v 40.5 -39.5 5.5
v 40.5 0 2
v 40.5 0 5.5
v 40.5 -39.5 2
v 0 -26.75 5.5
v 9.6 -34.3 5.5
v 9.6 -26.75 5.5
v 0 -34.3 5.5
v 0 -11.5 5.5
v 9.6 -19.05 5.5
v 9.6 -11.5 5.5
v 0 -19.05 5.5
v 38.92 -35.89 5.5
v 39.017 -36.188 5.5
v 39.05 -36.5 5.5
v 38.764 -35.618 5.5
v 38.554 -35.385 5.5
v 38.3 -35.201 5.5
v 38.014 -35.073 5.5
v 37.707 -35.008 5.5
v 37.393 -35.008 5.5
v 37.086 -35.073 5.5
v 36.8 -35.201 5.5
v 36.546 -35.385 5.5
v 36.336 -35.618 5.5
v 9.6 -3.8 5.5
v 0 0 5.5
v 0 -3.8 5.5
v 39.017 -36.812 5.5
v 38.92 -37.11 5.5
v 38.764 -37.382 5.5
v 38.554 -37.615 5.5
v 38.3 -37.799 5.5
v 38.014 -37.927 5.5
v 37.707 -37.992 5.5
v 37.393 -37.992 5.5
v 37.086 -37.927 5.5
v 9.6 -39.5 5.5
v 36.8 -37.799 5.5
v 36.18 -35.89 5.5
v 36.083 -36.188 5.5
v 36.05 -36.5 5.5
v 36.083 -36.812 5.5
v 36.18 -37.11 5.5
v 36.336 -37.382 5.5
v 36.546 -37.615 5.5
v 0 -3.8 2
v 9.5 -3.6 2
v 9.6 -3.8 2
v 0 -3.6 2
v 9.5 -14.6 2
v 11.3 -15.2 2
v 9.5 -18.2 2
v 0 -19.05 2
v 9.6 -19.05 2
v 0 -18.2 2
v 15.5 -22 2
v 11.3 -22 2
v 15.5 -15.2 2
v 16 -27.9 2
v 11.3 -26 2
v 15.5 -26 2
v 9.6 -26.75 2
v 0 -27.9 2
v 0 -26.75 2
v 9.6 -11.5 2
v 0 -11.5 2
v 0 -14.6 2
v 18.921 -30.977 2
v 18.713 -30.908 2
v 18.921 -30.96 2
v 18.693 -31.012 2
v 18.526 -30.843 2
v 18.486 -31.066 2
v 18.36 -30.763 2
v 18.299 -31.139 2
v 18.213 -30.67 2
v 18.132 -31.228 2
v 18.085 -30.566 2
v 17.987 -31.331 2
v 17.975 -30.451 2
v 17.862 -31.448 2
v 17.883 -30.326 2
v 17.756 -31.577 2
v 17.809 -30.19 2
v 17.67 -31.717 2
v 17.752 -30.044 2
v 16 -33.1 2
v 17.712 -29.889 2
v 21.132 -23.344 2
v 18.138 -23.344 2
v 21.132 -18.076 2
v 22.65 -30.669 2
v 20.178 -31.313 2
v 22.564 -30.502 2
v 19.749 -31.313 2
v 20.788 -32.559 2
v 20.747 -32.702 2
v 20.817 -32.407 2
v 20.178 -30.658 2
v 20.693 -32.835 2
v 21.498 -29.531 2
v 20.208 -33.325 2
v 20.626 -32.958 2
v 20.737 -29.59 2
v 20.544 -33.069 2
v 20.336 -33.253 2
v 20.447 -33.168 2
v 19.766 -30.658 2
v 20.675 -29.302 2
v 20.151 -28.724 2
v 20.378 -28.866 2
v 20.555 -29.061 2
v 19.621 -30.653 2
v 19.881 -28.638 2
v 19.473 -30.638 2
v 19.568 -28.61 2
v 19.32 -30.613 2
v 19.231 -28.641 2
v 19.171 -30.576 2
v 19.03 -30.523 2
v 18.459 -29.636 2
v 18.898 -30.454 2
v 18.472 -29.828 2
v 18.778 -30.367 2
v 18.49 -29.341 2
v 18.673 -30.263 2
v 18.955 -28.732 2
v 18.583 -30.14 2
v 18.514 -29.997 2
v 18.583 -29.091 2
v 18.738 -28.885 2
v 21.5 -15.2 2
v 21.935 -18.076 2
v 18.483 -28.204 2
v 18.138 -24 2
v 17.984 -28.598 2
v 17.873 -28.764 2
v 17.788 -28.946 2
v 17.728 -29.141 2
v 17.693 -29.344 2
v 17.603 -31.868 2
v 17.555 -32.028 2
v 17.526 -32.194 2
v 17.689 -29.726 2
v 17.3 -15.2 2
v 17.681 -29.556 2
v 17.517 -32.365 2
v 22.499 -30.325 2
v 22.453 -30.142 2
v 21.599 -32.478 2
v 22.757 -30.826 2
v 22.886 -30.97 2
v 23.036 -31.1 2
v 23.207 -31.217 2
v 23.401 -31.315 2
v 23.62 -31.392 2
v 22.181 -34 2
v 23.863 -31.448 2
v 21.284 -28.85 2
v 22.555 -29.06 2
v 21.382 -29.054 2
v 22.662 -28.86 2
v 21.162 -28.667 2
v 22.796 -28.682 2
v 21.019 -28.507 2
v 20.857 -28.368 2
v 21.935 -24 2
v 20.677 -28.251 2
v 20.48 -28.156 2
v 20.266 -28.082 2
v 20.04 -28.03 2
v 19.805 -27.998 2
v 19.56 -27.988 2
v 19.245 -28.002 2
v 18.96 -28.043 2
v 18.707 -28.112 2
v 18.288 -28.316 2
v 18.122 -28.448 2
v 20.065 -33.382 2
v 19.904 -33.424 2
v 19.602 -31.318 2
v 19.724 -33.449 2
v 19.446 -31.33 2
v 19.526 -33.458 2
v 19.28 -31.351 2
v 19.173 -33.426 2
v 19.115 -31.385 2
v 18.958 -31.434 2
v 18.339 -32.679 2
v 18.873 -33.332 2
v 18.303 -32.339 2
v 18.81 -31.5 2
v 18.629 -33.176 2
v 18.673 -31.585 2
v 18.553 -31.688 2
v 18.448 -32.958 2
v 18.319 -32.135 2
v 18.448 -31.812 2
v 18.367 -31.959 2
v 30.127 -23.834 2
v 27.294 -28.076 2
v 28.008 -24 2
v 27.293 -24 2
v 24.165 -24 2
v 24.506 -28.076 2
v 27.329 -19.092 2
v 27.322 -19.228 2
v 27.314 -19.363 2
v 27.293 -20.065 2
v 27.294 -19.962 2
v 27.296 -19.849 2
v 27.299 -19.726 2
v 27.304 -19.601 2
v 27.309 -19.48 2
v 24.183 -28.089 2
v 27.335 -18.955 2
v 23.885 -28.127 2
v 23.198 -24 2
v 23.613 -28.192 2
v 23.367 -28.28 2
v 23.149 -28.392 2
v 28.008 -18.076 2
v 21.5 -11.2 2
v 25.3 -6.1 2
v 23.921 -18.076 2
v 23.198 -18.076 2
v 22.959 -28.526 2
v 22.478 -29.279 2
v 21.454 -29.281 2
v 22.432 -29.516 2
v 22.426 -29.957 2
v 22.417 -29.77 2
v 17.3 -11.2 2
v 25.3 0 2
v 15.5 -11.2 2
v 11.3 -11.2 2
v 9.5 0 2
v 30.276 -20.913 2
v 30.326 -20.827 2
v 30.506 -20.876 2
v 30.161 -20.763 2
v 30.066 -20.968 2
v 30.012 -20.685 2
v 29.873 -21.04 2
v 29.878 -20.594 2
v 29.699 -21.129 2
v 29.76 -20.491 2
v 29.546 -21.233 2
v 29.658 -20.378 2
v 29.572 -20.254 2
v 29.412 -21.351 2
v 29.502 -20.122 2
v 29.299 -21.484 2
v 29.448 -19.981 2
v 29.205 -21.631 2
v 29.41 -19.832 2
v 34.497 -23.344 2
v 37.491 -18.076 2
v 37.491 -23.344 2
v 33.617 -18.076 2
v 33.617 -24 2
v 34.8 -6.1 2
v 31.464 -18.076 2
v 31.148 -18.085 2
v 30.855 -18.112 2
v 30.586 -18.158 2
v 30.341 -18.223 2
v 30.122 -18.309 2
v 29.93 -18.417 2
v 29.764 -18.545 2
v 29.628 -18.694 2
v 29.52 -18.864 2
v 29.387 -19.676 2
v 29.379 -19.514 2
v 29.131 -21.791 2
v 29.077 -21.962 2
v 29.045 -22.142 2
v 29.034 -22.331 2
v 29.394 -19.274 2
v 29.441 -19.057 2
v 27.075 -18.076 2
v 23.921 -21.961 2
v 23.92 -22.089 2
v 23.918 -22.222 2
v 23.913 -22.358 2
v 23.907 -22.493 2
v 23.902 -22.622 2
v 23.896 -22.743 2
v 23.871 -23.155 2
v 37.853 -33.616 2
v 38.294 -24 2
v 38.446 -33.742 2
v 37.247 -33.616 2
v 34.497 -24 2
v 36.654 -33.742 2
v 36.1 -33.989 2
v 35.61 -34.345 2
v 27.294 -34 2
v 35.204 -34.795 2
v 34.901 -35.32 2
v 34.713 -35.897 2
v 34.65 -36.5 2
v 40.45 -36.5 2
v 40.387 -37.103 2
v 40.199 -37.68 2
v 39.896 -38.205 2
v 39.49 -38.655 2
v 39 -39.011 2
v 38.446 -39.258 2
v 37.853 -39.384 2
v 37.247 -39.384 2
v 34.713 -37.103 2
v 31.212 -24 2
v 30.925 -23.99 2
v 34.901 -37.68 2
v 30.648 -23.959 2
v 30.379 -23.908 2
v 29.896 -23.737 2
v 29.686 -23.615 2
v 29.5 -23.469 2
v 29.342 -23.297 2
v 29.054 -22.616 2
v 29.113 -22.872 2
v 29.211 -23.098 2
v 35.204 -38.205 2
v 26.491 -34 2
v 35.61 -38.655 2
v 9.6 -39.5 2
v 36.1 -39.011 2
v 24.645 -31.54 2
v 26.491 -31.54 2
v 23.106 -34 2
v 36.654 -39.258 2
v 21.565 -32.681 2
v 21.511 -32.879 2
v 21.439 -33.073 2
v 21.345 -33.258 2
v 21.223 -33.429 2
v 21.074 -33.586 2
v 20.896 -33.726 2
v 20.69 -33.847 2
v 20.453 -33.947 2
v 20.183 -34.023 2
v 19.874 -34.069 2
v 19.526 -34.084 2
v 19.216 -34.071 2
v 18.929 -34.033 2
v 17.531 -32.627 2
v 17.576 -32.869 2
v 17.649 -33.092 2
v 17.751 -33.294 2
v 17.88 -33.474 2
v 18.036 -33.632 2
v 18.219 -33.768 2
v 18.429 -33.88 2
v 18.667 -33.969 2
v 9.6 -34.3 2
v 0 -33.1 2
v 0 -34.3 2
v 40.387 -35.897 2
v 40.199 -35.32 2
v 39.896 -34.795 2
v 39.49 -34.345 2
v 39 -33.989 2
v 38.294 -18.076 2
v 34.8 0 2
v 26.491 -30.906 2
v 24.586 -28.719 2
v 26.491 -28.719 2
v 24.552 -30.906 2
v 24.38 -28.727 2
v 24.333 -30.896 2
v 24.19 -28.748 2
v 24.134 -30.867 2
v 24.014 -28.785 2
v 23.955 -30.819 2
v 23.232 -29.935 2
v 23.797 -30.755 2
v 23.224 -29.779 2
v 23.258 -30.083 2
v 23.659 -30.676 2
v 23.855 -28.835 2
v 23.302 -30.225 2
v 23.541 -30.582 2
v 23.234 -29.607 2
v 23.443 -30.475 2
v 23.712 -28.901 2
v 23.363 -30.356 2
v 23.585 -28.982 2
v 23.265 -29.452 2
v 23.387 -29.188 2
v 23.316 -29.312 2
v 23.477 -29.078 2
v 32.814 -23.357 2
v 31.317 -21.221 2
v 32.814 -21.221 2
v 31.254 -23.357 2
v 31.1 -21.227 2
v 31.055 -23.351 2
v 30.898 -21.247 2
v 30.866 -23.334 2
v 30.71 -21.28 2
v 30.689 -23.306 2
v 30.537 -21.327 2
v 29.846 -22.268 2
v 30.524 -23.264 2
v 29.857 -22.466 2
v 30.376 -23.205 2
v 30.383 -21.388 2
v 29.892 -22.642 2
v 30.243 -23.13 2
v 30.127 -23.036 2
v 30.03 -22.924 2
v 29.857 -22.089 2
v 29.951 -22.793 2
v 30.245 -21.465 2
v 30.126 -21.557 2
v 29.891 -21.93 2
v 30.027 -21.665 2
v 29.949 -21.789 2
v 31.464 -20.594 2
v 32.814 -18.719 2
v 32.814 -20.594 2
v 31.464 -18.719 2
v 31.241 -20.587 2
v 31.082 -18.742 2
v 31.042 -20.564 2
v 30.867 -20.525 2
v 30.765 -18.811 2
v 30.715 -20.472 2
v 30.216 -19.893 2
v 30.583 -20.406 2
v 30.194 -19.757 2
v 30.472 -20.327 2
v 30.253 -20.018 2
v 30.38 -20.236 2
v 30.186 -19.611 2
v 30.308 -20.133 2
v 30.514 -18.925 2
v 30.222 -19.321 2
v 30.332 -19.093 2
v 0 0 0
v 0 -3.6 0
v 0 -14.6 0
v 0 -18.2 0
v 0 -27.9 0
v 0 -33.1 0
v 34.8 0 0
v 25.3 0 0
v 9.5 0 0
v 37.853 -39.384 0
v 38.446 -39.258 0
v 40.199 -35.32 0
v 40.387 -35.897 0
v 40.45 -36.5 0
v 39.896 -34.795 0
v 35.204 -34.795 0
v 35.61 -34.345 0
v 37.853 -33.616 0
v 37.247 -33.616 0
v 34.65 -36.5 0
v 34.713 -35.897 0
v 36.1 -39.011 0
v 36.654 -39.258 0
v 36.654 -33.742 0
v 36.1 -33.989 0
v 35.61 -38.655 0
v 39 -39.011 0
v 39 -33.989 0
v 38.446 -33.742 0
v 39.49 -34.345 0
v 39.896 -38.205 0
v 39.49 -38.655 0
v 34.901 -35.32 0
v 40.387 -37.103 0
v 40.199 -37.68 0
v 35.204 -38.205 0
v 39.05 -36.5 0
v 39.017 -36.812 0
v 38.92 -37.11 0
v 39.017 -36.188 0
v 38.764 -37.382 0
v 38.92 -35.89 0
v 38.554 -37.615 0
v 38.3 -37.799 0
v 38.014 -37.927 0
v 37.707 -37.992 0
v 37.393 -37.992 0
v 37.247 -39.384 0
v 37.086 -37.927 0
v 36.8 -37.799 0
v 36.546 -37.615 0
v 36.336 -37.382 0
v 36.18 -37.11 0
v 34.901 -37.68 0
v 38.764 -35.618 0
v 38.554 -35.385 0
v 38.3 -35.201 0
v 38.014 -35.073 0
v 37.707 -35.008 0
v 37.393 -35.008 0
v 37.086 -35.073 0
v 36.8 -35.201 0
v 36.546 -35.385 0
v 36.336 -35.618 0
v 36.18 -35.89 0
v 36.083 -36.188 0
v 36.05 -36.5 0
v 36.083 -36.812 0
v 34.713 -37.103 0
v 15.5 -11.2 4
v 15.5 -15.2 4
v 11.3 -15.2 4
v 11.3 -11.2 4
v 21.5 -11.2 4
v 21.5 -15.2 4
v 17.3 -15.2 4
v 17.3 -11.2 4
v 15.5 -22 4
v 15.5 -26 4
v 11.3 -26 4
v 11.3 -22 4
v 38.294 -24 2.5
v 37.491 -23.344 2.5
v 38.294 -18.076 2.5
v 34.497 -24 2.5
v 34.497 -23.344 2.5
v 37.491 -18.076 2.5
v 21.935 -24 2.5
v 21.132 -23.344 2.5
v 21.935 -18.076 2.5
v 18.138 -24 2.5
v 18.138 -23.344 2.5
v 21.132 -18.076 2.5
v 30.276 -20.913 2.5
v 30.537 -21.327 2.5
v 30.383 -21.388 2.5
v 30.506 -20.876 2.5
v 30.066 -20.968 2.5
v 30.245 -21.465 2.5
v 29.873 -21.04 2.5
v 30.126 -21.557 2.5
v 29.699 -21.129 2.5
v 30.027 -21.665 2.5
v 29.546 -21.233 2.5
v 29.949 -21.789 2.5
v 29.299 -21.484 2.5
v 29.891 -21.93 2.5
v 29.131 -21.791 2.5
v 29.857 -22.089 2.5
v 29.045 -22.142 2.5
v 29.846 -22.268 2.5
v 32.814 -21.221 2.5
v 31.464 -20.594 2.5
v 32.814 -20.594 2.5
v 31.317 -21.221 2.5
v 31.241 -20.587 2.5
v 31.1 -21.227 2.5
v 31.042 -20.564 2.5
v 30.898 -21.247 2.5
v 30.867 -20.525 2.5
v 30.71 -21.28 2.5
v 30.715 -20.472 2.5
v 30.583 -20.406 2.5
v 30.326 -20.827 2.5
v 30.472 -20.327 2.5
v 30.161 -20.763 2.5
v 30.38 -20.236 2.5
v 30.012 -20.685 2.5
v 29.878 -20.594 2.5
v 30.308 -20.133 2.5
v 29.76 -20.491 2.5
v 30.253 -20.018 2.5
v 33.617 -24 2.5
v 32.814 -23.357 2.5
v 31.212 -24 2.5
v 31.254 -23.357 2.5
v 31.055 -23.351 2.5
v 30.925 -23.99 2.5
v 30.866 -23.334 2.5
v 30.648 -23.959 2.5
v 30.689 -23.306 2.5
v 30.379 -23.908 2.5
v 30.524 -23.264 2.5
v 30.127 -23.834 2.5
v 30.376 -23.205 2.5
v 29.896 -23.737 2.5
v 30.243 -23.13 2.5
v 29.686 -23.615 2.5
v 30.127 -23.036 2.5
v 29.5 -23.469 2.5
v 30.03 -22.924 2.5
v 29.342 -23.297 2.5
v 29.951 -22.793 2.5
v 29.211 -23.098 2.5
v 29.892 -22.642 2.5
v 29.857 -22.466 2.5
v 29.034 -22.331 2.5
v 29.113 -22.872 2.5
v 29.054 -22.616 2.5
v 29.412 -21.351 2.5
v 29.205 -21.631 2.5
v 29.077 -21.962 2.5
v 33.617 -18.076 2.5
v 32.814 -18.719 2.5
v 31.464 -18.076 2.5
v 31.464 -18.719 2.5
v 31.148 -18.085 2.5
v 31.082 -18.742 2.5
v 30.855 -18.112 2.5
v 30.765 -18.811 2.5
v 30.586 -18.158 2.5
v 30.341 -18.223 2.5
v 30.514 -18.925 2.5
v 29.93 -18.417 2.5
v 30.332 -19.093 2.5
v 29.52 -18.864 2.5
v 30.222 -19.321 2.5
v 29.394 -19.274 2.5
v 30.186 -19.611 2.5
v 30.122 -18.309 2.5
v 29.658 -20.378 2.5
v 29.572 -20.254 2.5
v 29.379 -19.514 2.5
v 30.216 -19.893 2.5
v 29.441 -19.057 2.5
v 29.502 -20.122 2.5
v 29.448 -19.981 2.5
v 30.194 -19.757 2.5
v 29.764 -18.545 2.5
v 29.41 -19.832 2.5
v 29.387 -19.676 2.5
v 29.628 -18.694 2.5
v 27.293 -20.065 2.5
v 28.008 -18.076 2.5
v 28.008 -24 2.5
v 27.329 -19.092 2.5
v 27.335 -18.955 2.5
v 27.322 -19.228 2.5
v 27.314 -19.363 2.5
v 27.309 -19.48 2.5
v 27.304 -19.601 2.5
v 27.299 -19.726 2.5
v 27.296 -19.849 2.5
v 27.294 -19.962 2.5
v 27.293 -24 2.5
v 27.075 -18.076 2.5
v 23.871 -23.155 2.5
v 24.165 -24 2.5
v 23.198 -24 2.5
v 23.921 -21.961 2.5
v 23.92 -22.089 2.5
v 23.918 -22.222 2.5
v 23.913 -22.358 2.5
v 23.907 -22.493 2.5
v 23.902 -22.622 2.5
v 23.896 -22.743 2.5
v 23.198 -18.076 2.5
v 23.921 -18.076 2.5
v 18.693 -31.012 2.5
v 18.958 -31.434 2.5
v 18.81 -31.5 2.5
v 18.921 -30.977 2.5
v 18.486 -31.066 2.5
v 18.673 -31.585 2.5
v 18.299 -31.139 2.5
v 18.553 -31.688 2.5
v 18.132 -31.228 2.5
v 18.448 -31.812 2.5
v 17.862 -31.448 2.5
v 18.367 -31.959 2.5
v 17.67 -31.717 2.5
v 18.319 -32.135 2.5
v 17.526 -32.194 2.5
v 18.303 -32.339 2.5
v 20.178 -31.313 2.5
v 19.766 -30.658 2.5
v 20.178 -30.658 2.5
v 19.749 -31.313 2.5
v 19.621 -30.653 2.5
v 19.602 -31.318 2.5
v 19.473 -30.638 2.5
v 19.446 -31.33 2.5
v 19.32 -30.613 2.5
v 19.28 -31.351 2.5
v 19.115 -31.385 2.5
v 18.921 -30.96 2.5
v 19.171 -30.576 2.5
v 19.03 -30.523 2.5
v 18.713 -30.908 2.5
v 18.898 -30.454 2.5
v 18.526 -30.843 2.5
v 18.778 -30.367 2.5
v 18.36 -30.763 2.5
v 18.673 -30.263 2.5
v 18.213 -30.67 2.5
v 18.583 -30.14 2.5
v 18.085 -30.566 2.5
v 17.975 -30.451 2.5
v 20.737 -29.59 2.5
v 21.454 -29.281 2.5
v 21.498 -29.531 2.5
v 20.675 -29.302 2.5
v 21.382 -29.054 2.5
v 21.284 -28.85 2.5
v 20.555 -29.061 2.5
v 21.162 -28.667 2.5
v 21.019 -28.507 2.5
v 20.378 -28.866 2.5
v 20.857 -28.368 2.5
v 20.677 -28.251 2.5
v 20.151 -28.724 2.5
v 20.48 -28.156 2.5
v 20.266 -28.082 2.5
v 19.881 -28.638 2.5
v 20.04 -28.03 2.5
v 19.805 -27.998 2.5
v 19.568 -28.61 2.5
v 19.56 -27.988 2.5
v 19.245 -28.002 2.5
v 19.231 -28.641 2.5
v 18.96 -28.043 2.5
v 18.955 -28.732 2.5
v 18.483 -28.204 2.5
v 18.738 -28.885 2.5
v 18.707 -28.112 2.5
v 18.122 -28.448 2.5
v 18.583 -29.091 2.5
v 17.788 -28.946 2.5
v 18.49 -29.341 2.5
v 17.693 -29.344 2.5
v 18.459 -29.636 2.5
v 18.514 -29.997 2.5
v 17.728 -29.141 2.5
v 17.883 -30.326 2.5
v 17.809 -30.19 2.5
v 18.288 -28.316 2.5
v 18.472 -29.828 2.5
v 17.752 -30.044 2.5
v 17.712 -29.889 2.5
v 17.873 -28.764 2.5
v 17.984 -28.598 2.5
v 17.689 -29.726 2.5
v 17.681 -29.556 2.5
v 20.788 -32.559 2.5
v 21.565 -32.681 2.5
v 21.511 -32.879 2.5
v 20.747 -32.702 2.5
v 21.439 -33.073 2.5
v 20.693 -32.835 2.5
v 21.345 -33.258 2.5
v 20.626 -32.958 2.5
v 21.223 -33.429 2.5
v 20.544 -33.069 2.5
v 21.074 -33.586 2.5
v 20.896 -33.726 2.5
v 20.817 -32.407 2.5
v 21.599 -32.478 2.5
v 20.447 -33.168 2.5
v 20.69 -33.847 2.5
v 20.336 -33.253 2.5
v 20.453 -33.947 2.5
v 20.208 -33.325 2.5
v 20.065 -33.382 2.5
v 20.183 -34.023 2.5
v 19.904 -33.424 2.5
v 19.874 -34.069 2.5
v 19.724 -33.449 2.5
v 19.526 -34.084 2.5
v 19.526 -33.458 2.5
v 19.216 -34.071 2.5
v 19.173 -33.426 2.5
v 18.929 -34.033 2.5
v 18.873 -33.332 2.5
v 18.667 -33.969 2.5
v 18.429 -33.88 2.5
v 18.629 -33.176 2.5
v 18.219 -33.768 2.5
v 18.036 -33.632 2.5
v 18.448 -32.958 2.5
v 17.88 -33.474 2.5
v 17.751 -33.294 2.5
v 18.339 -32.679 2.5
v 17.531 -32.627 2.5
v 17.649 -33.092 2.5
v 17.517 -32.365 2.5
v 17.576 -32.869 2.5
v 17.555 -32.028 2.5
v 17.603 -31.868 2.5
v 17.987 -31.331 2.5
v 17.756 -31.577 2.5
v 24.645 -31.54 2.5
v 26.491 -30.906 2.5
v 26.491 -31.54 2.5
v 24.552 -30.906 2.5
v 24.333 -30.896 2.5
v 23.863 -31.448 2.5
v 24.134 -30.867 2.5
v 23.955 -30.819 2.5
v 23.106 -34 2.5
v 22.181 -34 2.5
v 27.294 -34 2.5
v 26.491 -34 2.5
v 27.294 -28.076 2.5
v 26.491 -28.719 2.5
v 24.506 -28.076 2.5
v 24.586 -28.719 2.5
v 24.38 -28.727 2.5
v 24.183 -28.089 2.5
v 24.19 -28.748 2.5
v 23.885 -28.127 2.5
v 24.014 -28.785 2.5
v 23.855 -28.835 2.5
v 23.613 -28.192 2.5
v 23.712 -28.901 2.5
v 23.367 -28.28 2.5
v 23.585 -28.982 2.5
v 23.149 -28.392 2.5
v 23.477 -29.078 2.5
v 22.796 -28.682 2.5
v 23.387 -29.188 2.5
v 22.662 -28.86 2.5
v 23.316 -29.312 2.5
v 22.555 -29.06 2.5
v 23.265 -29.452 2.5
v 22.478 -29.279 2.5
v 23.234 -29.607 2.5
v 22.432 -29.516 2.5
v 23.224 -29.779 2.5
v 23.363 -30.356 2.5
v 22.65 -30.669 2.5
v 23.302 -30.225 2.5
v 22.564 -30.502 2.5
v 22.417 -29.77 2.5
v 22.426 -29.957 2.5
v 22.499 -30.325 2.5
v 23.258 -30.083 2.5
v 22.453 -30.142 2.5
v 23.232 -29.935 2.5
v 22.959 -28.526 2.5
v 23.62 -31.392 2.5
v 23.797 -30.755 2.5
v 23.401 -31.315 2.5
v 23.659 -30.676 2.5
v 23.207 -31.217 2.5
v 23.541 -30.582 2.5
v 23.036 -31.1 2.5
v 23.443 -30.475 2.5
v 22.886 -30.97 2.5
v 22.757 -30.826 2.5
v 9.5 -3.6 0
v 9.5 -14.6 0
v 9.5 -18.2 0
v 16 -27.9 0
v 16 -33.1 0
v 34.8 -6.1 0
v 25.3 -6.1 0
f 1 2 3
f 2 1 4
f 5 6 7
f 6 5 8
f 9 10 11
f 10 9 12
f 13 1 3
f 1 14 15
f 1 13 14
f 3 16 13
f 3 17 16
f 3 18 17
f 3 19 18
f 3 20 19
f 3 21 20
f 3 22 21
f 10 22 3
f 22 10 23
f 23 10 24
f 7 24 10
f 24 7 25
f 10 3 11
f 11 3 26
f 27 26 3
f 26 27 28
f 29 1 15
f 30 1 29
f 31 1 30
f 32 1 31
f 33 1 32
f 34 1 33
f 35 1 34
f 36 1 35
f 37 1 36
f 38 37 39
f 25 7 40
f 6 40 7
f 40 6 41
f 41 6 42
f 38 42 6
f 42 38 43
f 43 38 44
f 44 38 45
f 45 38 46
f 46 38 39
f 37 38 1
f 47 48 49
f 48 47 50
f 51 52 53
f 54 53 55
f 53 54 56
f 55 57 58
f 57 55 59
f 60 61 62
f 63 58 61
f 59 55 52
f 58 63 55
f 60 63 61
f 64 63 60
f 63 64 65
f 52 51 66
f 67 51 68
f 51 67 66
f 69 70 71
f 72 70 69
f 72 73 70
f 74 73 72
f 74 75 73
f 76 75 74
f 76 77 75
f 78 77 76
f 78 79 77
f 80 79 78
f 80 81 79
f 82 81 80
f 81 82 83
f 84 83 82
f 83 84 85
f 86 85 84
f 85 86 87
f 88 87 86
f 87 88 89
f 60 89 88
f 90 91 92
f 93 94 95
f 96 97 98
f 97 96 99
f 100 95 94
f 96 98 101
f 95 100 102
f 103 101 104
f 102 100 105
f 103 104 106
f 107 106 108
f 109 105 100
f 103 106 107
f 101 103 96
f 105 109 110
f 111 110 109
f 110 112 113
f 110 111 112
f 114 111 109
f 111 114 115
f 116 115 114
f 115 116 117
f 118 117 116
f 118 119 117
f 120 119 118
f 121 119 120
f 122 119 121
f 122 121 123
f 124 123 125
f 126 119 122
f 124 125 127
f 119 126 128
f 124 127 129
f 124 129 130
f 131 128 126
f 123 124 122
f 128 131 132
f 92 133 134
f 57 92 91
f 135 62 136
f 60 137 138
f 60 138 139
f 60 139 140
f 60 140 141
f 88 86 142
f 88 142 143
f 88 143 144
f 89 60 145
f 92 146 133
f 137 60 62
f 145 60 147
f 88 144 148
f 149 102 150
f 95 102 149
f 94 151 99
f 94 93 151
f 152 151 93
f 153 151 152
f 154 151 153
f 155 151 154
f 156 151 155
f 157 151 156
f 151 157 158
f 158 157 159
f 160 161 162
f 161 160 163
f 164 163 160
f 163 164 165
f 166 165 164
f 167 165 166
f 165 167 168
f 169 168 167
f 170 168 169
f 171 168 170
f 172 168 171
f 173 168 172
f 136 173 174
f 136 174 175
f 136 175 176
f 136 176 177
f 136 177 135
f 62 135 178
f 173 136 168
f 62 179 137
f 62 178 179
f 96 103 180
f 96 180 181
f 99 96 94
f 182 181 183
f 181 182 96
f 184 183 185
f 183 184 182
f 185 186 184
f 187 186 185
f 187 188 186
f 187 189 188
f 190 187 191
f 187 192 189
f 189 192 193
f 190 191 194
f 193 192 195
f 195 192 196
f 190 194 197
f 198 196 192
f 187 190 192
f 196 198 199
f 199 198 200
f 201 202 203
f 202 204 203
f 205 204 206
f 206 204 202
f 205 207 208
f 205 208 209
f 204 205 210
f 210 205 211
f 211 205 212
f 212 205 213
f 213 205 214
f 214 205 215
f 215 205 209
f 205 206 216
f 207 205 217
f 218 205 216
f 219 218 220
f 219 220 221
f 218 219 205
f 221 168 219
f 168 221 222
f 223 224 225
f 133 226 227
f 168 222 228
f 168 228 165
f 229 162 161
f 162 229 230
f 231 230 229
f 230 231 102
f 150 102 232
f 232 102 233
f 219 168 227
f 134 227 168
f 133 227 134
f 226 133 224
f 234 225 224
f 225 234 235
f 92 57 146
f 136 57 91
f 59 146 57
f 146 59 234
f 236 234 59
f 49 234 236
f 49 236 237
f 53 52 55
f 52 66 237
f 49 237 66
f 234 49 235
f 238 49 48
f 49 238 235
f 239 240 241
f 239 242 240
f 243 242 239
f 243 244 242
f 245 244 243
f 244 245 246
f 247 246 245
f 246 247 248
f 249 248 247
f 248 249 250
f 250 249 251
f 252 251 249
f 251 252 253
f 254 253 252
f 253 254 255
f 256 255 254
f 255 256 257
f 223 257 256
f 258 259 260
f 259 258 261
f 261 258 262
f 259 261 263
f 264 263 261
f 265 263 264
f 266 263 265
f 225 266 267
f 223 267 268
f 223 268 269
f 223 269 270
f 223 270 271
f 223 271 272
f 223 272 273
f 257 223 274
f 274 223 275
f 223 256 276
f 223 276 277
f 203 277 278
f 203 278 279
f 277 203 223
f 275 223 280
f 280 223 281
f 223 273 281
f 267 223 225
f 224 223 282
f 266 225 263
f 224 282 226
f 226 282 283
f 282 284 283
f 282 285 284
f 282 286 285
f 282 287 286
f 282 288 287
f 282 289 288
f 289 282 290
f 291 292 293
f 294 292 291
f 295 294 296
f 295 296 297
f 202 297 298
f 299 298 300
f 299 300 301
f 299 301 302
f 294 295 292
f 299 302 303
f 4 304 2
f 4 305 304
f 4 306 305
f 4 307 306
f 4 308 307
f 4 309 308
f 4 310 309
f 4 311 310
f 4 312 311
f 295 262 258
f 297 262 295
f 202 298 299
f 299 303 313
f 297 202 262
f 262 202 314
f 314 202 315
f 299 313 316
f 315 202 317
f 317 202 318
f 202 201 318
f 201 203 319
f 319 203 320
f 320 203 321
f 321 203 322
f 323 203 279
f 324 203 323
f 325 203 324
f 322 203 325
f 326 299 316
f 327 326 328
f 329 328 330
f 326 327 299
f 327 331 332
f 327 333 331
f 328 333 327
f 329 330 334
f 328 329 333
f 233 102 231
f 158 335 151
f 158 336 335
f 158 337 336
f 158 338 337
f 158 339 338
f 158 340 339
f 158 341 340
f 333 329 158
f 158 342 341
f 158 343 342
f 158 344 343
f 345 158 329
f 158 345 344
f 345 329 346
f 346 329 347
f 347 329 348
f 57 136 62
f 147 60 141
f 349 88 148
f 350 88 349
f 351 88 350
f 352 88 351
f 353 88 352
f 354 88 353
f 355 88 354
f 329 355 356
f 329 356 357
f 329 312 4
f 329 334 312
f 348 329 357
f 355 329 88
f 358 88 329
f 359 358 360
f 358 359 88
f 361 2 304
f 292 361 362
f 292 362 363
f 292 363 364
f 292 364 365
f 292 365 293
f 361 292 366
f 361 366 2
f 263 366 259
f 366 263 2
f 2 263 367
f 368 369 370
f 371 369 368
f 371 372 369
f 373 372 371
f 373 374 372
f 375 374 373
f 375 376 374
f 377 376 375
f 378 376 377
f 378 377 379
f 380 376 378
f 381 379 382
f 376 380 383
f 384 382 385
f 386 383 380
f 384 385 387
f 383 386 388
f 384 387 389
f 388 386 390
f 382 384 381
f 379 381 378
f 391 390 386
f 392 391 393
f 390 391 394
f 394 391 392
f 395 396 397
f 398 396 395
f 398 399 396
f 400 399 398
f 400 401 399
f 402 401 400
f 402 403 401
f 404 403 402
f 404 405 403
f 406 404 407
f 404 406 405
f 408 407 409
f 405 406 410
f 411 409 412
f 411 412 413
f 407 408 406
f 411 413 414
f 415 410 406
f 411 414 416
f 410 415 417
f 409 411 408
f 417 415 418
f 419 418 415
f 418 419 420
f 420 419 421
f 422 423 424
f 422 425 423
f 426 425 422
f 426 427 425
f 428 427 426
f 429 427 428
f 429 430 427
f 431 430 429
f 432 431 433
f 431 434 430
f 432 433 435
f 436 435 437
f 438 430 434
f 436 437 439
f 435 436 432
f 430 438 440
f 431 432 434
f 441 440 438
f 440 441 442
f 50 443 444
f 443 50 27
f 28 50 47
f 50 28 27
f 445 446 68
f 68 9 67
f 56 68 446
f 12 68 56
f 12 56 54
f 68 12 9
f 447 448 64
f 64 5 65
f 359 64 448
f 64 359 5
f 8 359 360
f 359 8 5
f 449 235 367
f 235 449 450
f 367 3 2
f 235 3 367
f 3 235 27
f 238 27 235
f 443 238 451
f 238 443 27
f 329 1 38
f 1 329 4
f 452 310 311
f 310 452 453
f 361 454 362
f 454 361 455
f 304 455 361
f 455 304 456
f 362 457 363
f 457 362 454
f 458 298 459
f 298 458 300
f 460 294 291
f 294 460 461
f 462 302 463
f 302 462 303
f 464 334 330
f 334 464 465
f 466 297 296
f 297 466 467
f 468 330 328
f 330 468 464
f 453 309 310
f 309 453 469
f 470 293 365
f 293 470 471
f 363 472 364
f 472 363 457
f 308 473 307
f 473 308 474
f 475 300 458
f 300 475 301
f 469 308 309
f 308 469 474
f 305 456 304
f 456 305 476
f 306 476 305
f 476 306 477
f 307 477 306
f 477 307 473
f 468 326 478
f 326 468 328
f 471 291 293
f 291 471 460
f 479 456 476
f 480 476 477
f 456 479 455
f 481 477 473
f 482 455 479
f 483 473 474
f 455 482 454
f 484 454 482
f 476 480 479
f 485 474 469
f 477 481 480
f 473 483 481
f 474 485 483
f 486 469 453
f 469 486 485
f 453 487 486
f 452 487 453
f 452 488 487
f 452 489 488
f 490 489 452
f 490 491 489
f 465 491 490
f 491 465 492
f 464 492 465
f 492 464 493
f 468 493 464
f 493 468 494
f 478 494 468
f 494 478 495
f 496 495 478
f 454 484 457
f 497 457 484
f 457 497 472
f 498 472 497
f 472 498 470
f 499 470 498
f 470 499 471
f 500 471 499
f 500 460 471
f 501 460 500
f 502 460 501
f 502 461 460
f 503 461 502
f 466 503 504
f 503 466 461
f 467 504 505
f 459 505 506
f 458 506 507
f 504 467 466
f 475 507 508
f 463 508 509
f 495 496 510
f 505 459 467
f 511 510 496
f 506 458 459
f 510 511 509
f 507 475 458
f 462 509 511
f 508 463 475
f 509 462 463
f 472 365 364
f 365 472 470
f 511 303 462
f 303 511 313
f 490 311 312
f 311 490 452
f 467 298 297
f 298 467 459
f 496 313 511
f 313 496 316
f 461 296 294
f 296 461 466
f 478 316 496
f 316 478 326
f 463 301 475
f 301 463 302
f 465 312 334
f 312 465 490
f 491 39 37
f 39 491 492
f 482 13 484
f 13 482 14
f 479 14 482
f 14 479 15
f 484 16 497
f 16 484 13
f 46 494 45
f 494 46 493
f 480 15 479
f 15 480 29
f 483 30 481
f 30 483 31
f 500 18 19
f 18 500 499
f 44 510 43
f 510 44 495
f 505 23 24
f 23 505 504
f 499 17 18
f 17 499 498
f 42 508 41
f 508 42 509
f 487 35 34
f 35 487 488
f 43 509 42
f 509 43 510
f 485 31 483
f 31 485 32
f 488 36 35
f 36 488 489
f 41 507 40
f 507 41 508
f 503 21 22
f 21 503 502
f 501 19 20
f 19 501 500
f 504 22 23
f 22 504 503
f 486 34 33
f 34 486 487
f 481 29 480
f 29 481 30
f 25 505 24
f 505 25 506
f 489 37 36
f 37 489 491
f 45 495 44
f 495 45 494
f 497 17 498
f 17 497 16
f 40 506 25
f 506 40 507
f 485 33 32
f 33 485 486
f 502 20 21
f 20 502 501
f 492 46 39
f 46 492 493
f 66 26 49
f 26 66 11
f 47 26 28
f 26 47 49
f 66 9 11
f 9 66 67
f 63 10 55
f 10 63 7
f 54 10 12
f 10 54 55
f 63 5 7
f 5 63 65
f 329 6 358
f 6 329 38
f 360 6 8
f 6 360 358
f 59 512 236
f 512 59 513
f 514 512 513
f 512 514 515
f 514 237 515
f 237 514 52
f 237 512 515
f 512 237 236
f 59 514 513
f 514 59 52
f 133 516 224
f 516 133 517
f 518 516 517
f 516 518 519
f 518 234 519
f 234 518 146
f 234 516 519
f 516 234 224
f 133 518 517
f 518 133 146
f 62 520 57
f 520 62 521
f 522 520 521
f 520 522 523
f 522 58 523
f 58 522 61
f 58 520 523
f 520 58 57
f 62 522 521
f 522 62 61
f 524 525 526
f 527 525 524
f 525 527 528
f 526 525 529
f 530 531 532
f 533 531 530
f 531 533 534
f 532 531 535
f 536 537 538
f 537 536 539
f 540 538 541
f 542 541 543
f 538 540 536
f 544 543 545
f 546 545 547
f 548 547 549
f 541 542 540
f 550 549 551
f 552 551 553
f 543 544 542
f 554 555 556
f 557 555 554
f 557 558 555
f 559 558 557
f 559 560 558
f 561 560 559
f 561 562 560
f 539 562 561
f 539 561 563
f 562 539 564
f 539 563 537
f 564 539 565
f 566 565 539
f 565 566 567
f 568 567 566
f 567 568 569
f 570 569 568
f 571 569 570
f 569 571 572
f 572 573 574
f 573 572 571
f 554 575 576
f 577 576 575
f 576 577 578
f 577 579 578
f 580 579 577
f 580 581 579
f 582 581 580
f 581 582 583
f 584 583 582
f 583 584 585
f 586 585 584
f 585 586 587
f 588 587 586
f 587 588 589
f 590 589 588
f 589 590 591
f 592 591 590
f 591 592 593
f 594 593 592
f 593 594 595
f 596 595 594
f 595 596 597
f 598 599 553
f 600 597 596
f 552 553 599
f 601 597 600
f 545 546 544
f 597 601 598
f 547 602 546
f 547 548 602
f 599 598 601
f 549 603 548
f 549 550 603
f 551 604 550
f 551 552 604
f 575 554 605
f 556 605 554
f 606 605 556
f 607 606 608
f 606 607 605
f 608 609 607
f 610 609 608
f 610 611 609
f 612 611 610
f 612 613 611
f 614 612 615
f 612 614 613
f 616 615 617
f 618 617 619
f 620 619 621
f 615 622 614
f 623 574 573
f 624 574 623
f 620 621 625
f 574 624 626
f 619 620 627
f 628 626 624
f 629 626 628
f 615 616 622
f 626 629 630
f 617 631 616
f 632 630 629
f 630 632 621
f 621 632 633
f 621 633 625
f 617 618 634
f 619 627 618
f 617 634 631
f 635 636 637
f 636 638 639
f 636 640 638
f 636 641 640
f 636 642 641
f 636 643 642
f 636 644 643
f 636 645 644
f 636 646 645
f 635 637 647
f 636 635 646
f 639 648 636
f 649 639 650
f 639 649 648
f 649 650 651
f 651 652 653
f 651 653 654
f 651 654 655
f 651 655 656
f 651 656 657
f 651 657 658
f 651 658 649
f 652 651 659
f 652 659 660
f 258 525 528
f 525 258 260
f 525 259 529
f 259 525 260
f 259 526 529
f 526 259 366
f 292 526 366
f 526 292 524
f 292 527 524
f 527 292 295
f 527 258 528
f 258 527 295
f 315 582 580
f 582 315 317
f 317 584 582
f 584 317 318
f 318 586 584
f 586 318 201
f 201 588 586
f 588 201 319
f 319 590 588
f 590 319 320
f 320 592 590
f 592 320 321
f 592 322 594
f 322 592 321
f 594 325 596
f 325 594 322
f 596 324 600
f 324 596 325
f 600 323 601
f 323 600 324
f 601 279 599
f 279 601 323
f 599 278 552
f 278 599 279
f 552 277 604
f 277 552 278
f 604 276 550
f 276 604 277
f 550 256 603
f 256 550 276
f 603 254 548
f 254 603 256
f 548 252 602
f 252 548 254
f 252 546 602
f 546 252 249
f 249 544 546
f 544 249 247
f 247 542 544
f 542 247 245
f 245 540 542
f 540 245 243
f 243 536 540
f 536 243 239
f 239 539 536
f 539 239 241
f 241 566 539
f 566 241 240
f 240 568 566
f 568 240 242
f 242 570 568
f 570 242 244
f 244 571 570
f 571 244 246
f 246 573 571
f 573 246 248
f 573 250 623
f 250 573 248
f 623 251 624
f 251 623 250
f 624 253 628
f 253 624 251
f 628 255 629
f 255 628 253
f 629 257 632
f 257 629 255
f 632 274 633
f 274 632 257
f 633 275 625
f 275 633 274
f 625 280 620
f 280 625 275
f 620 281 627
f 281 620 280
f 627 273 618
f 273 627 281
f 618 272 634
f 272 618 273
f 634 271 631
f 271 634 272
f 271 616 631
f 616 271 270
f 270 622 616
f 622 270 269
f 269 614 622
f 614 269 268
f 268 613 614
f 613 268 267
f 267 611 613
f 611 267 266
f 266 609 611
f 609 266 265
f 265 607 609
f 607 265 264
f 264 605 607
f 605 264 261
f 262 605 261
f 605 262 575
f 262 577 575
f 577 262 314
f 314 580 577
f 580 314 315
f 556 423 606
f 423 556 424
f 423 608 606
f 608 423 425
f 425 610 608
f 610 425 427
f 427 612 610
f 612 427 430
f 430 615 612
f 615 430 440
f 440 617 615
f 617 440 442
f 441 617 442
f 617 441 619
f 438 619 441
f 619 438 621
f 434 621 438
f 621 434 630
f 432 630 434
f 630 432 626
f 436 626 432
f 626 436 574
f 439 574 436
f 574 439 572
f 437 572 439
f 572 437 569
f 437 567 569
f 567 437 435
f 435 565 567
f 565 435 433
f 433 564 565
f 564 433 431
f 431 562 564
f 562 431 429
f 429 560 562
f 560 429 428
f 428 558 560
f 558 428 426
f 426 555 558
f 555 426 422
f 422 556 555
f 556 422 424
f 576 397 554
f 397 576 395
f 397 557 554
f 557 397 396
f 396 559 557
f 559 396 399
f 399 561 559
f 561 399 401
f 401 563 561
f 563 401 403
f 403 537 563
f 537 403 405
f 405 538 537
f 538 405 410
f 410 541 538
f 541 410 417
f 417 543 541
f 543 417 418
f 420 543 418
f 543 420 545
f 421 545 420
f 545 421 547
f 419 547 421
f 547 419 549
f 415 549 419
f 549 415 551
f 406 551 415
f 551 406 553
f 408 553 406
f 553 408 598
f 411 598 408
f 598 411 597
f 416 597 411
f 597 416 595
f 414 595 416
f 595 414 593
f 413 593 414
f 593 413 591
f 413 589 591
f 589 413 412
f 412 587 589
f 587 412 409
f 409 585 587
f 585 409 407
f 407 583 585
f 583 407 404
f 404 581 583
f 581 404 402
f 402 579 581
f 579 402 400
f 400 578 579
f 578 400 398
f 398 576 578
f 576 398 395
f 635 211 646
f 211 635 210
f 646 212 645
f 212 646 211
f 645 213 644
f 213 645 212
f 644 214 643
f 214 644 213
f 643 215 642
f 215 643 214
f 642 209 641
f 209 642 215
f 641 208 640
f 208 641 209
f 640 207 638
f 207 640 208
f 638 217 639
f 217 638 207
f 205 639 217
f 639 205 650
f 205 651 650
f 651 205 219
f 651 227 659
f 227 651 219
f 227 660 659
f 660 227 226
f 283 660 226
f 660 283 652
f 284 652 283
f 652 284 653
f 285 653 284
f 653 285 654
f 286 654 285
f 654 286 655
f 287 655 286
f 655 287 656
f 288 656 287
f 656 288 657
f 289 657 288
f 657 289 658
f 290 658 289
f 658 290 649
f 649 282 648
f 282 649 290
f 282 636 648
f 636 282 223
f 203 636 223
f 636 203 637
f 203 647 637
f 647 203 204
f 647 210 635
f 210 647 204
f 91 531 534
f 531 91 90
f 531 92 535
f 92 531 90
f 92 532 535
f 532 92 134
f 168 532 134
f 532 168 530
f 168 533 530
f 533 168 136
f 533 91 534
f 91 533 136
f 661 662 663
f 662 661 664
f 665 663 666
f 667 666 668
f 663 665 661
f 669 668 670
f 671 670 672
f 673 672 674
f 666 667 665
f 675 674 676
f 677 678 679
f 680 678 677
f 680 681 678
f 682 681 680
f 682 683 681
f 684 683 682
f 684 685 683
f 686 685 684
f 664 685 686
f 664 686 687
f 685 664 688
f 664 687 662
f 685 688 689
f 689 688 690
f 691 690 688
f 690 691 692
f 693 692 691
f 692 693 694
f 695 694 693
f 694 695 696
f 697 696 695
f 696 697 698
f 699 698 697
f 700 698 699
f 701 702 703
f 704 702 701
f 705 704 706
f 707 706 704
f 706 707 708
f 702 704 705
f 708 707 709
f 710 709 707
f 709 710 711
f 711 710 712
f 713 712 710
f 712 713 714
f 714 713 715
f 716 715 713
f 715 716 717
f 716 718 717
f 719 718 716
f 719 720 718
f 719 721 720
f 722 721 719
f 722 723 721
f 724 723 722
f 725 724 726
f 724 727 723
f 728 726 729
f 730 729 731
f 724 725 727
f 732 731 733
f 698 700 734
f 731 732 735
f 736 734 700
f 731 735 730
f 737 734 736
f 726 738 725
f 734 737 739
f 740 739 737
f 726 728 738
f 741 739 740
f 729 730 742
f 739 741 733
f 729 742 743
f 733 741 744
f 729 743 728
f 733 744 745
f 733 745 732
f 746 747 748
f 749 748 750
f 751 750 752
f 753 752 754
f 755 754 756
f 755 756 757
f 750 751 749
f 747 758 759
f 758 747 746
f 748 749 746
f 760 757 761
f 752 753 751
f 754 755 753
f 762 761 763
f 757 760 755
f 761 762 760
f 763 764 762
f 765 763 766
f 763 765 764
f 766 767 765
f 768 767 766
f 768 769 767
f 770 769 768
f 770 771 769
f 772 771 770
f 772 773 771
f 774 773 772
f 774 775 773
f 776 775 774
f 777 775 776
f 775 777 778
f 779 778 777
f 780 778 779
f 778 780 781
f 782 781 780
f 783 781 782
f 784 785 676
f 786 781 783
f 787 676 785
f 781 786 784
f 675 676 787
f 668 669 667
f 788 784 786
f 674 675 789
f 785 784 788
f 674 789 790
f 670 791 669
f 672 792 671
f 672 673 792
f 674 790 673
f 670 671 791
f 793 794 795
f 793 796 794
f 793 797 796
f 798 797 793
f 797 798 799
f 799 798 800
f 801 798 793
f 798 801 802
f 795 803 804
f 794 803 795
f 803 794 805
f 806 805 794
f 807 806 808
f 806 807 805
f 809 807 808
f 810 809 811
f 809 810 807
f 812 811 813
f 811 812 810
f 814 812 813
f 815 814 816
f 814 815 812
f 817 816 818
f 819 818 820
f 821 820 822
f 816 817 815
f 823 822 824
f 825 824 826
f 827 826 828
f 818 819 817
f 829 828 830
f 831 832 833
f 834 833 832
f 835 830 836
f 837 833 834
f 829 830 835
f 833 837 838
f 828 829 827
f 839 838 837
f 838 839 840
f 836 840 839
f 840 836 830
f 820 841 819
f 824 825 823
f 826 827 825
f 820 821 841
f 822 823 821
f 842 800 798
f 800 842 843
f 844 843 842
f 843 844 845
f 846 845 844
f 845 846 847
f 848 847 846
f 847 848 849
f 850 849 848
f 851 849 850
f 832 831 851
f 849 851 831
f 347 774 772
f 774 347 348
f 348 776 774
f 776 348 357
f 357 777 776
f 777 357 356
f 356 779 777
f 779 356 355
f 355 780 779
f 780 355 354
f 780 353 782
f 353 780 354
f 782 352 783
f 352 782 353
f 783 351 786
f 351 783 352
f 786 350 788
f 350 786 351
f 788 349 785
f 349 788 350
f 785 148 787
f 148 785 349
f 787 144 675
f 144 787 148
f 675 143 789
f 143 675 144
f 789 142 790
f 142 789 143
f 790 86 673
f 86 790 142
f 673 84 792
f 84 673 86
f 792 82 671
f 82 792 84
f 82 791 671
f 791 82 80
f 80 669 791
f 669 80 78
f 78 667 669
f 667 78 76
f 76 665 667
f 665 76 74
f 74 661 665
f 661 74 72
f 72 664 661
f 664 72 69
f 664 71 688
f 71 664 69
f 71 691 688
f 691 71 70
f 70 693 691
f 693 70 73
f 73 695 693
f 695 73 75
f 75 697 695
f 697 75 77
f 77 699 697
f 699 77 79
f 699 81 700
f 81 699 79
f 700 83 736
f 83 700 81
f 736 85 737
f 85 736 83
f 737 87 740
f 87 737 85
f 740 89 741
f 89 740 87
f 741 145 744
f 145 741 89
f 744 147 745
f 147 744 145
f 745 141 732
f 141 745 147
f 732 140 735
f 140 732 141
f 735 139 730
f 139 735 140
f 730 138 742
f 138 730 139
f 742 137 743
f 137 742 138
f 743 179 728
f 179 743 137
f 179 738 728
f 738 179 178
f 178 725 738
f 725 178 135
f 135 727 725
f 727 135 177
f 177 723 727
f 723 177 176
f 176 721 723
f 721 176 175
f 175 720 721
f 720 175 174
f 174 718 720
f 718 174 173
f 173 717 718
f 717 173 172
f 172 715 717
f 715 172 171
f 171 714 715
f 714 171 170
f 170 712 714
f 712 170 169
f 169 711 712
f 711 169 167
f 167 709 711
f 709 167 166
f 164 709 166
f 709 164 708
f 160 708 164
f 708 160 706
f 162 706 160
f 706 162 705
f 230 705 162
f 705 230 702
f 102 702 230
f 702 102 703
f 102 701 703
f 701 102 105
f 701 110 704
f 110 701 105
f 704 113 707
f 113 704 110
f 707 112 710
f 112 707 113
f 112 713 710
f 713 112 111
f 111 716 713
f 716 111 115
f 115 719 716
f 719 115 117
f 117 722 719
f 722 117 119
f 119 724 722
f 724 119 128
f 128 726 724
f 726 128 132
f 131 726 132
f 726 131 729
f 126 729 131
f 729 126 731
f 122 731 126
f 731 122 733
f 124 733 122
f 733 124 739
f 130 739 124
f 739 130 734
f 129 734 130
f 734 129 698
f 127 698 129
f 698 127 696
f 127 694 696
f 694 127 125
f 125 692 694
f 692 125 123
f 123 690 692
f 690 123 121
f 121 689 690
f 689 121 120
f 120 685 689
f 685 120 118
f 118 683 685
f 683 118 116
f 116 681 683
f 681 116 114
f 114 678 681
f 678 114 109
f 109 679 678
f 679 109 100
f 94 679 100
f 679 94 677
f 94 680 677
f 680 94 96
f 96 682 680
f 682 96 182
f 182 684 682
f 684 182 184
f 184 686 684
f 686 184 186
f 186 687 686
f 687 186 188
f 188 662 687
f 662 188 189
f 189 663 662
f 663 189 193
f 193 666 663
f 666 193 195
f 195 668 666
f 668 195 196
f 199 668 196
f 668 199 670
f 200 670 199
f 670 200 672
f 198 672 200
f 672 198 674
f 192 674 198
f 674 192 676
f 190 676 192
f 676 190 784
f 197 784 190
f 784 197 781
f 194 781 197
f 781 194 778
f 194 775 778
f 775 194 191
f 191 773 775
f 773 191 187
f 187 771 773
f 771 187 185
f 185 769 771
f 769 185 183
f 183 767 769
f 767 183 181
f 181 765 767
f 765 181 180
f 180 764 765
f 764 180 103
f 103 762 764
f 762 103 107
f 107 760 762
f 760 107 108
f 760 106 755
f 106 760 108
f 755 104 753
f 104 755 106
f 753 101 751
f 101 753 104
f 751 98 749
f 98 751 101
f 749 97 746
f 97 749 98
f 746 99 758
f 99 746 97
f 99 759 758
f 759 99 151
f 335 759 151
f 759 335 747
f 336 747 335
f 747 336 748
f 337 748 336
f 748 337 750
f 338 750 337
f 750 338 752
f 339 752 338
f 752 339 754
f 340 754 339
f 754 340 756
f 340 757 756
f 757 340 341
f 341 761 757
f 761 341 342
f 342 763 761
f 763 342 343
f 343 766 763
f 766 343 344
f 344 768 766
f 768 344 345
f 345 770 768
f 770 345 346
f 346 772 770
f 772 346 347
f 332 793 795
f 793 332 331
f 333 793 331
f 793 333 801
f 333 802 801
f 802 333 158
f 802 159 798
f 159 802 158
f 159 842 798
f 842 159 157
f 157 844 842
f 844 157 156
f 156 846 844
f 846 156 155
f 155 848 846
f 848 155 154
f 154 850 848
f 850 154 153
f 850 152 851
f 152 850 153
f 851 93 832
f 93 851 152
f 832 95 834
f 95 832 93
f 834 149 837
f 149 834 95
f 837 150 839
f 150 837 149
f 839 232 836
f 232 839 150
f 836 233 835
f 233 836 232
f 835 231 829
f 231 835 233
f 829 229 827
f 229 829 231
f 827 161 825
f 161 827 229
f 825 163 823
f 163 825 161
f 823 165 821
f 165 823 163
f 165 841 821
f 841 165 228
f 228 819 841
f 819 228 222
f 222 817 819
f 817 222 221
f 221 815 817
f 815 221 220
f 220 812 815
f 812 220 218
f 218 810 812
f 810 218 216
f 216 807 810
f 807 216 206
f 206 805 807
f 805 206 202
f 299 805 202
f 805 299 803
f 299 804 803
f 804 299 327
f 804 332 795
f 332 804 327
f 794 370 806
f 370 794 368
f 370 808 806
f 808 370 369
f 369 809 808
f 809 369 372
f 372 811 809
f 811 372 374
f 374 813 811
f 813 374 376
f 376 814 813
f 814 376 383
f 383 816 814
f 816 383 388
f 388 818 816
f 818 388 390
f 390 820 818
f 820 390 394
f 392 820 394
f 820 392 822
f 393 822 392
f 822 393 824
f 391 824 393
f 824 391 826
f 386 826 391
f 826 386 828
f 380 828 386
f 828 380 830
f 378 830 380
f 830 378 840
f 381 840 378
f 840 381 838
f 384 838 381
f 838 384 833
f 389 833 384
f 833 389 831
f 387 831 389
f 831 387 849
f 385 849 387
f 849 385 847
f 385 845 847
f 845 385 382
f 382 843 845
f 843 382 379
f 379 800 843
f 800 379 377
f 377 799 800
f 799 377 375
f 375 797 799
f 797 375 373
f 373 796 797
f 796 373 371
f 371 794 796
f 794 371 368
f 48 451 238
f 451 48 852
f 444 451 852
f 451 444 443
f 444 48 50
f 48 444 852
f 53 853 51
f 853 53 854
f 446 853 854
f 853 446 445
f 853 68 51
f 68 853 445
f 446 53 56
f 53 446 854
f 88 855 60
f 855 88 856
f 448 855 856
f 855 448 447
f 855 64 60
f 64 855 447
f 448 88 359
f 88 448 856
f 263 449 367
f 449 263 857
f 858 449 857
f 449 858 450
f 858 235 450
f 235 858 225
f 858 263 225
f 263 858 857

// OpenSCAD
/* Digitizer cover to protect its transformers near J3 and J20 */
/* Obsolete, see cover2c.scad */
/* See also covergen.py */

/* 5 mm from board to attached SMA connector, which still fits in */
/* the 7.9 mm cutout for the board-mount SMA connector. */
/* 7 mm from board to the beginning of the hex section. */
/* Part is 5.5 mm thick, to avoid slight interference with SMA connectors found with a 6mm thick version. */

module cover()
{
  union() {
    difference() {
       union () {
          translate([0, -39.5, 2]) cube([40.5, 39.5, 3.5]);
          /* copper pad on board measures 5.8 mm dia */
          translate([37.55,-36.5, 0]) cylinder(r=2.9, h=4, $fn=30);
       }
       union () {
          /* 106.3 mil = 2.7 mm dia hole, tight clearance for 4-40 */
          translate([37.55, -36.5, -1]) cylinder(r=1.5, h=8, $fn=30);
          translate([ -1, -11.50, 0]) cube([10.6, 7.7, 8]);  /* J3  */
          translate([ -1, -26.75, 0]) cube([10.6, 7.7, 8]);  /* J20 */
          translate([ -1, -42.00, 0]) cube([10.6, 7.7, 8]);  /* J11 */
          /* TCM4-19 datasheet claims max height 4.06 mm, I measure 3.1 mm */
          translate([11.3, -15.2, 0]) cube([4.2, 4, 4.0]);  /* U34 */
          translate([17.3, -15.2, 0]) cube([4.2, 4, 4.0]);  /* T1 */
          translate([11.3, -26.0, 0]) cube([4.2, 4, 4.0]);  /* T1 */
          translate([39, -24, 1]) mirror(v=[1, 0, 0]) linear_extrude(height = 1.5) {
              text("LBNL", size = 6.2, font = "Liberation Sans");
          }
          translate([28, -34, 1]) mirror(v=[1, 0, 0]) linear_extrude(height = 1.5) {
              text("R3", size = 6.2, font = "Liberation Sans");
          }
       }
    }
    /* these are the stubs supposed to rest on the bare board */
    translate([0,    -3.6, 0]) cube([ 9.5, 3.6, 2]);
    translate([0,   -18.2, 0]) cube([ 9.5, 3.6, 2]);
    translate([0,   -33.1, 0]) cube([16.0, 5.2, 2]);
    translate([25.3, -6.1, 0]) cube([ 9.5, 6.1, 2]);
  }
}

cover();
